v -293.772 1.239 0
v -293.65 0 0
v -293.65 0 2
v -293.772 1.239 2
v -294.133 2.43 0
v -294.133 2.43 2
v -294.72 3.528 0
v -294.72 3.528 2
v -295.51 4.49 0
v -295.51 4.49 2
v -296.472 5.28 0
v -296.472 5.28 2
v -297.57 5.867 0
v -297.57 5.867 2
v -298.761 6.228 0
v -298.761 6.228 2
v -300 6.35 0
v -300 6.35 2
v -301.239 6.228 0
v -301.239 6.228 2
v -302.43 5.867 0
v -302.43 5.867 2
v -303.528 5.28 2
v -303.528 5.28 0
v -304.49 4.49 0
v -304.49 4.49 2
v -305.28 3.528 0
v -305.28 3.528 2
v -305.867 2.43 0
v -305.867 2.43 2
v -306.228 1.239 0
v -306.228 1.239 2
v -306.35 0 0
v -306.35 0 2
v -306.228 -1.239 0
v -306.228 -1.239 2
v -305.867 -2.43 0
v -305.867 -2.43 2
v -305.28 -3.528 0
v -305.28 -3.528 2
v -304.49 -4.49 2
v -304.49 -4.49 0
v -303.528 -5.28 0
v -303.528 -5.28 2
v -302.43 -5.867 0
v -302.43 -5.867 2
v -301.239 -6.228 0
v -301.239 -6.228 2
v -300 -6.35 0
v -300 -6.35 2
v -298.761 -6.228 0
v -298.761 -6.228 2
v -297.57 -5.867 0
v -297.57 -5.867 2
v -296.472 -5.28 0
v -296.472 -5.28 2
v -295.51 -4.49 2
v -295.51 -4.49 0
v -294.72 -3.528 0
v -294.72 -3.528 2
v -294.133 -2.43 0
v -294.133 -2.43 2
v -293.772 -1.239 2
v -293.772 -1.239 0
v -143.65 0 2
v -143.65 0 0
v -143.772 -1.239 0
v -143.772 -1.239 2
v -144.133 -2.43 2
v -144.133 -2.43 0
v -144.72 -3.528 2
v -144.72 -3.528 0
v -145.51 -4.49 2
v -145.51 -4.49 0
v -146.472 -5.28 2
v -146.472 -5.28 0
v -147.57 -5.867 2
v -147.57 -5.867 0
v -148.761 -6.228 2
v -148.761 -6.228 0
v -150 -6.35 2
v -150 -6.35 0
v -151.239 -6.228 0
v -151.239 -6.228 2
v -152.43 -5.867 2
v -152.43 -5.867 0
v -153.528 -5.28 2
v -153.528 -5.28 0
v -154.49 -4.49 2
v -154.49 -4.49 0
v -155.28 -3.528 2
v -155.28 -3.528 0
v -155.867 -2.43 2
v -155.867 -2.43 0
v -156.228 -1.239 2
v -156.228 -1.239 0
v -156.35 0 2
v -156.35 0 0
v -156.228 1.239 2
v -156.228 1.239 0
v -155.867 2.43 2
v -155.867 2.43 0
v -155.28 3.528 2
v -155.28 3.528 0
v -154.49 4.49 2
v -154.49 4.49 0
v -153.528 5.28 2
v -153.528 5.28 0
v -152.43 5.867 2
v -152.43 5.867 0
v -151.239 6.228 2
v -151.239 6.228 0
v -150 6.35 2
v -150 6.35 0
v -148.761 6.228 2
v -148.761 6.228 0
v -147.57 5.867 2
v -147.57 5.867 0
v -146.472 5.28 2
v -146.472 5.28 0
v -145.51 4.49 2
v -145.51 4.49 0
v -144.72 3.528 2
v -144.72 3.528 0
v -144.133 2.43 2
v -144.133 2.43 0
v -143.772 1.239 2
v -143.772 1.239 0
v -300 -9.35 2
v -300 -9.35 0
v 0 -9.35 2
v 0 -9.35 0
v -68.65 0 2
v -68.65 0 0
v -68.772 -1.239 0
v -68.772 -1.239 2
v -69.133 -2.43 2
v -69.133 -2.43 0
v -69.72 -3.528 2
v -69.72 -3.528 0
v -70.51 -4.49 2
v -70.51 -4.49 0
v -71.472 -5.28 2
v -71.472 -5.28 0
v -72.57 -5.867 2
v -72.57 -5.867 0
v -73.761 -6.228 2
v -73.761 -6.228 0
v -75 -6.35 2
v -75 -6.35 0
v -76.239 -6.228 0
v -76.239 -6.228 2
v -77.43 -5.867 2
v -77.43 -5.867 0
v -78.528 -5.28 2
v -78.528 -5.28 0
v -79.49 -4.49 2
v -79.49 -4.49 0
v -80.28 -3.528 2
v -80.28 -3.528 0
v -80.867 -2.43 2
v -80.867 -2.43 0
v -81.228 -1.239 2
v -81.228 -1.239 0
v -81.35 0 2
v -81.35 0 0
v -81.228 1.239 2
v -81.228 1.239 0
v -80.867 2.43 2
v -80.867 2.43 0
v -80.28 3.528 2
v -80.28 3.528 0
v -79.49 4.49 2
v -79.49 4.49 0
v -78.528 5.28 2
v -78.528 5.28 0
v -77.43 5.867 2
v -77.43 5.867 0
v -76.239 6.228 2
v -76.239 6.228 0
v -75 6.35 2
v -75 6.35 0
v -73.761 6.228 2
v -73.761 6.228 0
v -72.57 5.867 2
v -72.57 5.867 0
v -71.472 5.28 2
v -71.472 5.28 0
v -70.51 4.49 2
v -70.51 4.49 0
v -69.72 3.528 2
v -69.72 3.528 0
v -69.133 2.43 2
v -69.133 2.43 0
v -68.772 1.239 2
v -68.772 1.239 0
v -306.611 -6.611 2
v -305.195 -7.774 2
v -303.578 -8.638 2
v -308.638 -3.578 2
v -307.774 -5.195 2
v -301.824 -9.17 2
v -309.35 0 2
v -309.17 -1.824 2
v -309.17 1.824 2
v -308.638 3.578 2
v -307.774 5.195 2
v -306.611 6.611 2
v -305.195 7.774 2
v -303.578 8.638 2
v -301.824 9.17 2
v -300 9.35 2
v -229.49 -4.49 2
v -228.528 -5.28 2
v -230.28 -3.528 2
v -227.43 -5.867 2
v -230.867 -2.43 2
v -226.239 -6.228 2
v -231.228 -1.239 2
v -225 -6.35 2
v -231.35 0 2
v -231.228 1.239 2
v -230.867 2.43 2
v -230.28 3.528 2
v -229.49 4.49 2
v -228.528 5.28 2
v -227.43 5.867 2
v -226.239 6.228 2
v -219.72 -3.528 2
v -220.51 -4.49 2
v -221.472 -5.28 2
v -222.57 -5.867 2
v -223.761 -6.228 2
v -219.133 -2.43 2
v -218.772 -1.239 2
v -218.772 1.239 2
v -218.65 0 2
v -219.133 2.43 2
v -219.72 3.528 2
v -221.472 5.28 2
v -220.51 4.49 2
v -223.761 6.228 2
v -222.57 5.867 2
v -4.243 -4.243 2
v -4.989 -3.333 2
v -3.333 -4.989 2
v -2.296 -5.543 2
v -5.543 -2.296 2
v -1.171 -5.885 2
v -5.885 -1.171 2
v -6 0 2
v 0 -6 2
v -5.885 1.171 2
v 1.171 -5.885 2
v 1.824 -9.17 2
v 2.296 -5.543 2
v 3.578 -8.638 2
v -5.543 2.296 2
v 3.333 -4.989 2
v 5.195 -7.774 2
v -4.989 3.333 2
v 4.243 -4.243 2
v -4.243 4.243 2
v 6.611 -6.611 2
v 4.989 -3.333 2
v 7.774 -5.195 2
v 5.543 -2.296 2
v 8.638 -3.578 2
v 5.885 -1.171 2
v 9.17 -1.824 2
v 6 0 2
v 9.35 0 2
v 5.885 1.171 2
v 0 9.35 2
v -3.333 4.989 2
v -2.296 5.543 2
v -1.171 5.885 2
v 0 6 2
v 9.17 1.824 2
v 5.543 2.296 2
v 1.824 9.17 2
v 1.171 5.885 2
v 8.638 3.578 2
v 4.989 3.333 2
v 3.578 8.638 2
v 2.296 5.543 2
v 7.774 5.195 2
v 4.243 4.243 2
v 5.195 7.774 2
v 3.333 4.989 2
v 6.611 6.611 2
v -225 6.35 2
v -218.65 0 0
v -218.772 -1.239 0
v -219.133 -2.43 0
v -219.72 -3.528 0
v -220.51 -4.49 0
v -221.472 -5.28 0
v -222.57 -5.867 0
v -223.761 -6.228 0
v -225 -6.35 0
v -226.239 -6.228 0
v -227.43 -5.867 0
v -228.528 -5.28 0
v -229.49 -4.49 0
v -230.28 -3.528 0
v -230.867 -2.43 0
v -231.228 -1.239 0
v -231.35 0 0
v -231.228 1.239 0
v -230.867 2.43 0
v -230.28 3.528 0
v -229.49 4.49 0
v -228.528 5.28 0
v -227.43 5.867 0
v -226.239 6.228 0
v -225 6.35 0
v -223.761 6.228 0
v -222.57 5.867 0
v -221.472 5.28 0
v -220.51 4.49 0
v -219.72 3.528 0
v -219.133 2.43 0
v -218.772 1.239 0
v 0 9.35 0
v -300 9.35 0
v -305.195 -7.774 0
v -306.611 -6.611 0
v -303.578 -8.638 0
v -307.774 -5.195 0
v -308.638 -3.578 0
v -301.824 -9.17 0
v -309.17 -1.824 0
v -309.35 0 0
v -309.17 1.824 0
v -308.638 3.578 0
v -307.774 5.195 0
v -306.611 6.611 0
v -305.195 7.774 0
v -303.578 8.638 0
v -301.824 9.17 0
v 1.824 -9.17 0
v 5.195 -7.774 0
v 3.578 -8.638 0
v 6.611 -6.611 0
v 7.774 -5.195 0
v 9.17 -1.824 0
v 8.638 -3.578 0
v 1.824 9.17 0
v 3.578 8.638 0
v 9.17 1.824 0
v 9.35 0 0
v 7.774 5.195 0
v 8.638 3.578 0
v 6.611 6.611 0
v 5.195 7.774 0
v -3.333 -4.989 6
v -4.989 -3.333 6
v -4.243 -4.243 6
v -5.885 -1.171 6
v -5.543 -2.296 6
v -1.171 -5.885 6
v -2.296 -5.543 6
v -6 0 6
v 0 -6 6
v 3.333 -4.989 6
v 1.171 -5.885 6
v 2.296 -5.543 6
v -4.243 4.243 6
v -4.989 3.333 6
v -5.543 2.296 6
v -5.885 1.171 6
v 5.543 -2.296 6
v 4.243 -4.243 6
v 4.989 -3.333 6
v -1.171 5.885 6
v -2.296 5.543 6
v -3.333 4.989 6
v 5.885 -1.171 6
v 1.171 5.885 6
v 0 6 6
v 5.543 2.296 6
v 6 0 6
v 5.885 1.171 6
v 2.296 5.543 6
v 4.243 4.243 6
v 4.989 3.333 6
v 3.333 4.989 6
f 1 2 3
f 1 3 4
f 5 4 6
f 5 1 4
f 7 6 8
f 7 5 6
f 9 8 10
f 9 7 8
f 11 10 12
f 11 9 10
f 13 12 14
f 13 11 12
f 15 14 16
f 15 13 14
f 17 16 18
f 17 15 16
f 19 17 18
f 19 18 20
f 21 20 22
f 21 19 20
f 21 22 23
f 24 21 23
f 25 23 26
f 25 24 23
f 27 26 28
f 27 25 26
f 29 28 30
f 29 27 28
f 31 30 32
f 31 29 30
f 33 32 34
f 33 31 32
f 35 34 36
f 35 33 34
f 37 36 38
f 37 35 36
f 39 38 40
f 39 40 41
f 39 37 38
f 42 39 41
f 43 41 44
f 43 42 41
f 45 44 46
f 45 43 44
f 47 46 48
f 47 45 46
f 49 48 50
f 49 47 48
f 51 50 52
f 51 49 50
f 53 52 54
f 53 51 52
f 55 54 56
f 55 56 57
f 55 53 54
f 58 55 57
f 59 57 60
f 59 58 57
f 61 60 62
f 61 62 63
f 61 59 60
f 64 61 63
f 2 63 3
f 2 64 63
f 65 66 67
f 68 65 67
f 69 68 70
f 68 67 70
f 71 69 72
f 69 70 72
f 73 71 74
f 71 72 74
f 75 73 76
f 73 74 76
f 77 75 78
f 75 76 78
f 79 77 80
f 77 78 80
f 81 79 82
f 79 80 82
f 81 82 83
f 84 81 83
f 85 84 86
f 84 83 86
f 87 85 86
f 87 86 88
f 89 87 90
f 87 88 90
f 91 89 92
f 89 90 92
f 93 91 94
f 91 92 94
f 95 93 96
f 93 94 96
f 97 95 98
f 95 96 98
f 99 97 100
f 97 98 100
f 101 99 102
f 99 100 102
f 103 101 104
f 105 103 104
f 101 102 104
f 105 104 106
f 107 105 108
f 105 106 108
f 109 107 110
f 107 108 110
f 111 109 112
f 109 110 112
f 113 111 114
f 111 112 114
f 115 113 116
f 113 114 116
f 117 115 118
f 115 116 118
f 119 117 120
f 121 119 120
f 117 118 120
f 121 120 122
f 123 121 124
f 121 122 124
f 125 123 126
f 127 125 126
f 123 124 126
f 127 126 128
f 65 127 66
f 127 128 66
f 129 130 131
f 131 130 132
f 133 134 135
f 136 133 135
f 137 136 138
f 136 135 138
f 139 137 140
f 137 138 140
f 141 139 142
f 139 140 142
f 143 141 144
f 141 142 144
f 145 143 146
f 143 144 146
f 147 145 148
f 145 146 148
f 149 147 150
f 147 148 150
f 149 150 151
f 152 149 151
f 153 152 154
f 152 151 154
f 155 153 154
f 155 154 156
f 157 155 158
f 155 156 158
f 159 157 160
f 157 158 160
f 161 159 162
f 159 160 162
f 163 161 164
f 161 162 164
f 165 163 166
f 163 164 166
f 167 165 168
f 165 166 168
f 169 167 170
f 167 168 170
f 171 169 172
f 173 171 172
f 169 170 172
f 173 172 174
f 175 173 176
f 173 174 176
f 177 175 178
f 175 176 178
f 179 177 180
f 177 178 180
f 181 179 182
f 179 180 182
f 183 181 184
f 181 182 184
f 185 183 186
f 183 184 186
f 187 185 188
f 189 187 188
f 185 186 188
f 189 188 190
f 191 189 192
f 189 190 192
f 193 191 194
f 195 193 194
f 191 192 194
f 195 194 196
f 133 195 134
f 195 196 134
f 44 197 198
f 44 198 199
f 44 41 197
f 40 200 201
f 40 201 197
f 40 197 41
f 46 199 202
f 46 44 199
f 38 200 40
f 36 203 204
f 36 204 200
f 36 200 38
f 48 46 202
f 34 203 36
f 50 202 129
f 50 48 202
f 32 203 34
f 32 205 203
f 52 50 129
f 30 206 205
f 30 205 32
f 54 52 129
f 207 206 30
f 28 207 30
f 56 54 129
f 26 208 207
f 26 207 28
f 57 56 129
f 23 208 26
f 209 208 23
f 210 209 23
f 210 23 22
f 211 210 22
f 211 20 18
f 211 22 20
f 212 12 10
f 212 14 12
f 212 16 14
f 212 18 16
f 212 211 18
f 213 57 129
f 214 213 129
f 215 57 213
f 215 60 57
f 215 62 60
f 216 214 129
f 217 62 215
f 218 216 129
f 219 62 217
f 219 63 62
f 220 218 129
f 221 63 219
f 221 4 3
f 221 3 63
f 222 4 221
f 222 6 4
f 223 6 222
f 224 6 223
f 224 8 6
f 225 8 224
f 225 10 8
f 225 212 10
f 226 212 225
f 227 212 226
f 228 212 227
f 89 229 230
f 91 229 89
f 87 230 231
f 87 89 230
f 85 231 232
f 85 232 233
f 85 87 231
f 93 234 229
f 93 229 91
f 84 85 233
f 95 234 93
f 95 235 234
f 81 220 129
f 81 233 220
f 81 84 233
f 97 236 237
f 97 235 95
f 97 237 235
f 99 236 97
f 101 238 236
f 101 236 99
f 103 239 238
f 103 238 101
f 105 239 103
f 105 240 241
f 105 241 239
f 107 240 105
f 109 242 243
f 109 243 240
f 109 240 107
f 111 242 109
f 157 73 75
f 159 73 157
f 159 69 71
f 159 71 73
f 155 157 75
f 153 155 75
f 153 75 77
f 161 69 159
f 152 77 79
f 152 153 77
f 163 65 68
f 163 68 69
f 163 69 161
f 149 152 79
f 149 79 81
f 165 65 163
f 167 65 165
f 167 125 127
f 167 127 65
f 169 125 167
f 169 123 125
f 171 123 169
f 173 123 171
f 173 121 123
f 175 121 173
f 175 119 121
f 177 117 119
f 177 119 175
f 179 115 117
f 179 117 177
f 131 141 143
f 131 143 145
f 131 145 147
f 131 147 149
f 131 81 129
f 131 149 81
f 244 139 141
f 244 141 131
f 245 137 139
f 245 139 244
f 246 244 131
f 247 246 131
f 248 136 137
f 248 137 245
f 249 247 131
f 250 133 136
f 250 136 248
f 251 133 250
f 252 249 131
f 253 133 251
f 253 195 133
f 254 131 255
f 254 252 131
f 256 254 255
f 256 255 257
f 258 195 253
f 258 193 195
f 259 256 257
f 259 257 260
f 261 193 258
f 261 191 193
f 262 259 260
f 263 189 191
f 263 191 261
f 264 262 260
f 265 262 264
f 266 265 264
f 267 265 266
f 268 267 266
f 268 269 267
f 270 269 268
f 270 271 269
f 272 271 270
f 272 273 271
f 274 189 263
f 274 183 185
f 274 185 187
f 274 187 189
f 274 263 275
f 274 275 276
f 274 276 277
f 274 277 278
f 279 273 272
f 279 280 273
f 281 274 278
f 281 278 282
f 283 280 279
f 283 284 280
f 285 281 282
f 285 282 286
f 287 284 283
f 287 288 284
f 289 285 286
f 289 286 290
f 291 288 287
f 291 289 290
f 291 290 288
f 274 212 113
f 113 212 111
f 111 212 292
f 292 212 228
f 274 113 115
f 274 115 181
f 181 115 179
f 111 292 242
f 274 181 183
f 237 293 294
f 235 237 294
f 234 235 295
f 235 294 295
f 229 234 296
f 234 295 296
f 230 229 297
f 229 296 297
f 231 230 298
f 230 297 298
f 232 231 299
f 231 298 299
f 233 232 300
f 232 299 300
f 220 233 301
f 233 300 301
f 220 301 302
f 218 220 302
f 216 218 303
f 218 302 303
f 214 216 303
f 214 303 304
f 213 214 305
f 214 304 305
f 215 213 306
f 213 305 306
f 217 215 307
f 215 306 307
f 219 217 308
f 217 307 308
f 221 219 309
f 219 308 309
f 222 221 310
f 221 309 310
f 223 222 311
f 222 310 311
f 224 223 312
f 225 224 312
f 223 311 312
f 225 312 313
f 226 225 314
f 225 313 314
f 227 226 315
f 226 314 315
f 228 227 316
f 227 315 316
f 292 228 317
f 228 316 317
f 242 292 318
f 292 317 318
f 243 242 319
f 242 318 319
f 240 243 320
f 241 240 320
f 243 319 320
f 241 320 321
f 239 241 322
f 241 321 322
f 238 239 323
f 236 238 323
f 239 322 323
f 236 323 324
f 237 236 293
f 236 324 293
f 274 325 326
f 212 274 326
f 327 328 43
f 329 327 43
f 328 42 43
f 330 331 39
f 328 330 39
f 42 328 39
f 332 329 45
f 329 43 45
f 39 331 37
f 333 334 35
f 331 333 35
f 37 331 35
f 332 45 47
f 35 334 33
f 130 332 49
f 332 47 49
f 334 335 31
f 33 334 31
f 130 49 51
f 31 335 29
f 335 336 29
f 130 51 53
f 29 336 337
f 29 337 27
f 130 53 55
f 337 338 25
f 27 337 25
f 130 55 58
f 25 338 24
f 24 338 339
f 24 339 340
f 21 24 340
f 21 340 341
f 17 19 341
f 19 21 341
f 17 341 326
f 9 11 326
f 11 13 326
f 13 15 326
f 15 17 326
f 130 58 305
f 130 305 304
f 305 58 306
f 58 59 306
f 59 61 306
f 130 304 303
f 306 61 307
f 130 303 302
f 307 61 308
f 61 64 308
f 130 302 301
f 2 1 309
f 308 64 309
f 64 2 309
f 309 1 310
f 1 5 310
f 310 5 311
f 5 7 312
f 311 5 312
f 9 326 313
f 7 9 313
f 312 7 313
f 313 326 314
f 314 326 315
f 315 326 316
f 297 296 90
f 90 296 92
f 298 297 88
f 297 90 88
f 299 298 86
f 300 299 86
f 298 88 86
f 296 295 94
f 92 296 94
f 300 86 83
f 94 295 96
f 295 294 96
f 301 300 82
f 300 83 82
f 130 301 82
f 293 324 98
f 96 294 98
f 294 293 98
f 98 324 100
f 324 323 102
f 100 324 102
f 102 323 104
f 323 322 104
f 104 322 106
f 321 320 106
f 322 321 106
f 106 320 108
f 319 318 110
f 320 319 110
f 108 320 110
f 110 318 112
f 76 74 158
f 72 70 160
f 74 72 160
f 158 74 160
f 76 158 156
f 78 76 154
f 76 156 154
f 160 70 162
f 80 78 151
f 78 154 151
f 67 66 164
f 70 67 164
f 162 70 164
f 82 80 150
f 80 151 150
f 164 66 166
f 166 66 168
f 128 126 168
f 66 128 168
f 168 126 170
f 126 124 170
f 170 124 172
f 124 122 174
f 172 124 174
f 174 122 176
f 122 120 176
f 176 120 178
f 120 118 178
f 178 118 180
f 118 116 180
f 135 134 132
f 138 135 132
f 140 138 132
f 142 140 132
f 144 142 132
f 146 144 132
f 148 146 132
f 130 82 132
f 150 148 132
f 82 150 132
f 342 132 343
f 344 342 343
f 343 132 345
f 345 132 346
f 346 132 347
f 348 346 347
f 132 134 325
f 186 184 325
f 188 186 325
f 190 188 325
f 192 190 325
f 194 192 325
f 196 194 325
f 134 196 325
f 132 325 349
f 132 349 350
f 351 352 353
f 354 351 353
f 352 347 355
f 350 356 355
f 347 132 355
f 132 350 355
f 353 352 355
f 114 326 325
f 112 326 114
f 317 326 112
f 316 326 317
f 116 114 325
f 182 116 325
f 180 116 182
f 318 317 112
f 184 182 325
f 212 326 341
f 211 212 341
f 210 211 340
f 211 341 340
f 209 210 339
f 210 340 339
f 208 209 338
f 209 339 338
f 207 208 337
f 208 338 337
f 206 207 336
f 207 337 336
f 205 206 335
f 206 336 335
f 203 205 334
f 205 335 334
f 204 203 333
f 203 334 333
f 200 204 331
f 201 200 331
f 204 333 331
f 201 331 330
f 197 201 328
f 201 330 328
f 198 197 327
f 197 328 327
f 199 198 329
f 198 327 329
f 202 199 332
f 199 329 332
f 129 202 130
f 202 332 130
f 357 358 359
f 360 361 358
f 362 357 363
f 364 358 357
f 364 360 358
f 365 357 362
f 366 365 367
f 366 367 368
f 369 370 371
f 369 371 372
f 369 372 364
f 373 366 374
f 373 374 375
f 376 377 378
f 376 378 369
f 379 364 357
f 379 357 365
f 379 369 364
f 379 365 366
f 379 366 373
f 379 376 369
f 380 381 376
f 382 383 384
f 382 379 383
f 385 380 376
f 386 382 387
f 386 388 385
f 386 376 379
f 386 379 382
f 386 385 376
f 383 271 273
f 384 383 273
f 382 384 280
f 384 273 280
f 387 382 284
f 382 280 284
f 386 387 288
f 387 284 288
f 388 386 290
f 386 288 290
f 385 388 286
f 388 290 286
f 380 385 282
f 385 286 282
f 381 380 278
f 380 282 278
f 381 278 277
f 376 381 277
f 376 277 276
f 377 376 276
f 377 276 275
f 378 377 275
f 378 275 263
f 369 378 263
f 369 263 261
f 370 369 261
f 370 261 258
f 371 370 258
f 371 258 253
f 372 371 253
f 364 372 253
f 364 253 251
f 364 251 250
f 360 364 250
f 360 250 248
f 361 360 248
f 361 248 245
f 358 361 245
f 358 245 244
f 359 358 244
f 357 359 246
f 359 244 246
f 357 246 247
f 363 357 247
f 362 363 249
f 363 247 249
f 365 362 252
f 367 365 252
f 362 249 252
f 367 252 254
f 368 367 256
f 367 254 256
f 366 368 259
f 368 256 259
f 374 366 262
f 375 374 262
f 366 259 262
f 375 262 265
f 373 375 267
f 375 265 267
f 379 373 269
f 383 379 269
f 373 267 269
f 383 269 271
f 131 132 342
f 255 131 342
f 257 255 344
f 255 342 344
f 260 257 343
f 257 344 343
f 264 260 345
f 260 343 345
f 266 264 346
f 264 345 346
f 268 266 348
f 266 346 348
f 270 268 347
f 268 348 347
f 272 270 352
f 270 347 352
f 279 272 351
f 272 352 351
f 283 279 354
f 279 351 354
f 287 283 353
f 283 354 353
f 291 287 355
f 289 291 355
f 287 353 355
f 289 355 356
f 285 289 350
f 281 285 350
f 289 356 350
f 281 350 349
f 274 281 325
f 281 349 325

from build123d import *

# Parameters (mm, degrees)
F0_R     = 6.35
F1_DEPTH = 2
F2_DEPTH = 6


with BuildPart() as f1:
    # F0 (on Top) → F1 (new body)
    with BuildSketch(Plane.XY):
        with BuildLine():
            ThreePointArc((-6, 0), (0, -6), (6, 0))
            ThreePointArc((6, 0), (0, 6), (-6, 0))
        make_face()
        with Locations((-300, 0)):
            Circle(F0_R)
        with BuildLine():
            Line((0, 9.35), (-300, 9.35))
            ThreePointArc((-300, 9.35), (-309.35, 0), (-300, -9.35))
            Line((-300, -9.35), (0, -9.349931))
            ThreePointArc((0, -9.349931), (9.349963, 3.5e-05), (0, 9.35))
        make_face()
        with Locations((-300, 0)):
            Circle(F0_R, mode=Mode.SUBTRACT)
        with BuildLine():
            ThreePointArc((-231.35, 0), (-225, 6.35), (-218.65, 0))
            ThreePointArc((-218.65, 0), (-225, -6.35), (-231.35, 0))
        make_face(mode=Mode.SUBTRACT)
        with BuildLine():
            ThreePointArc((-156.35, 0), (-150, 6.35), (-143.65, 0))
            ThreePointArc((-143.65, 0), (-150, -6.35), (-156.35, 0))
        make_face(mode=Mode.SUBTRACT)
        with BuildLine():
            ThreePointArc((-81.35, 0), (-75, 6.35), (-68.65, 0))
            ThreePointArc((-68.65, 0), (-75, -6.35), (-81.35, 0))
        make_face(mode=Mode.SUBTRACT)
        with BuildLine():
            ThreePointArc((-6, 0), (0, 6), (6, 0))
            ThreePointArc((6, 0), (0, -6), (-6, 0))
        make_face(mode=Mode.SUBTRACT)
    extrude(amount=F1_DEPTH)

    # F0 (on Top) → F2 (join)
    with BuildSketch(Plane.XY):
        with BuildLine():
            ThreePointArc((-6, 0), (0, -6), (6, 0))
            ThreePointArc((6, 0), (0, 6), (-6, 0))
        make_face()
    extrude(amount=F2_DEPTH)


solid = f1.part
